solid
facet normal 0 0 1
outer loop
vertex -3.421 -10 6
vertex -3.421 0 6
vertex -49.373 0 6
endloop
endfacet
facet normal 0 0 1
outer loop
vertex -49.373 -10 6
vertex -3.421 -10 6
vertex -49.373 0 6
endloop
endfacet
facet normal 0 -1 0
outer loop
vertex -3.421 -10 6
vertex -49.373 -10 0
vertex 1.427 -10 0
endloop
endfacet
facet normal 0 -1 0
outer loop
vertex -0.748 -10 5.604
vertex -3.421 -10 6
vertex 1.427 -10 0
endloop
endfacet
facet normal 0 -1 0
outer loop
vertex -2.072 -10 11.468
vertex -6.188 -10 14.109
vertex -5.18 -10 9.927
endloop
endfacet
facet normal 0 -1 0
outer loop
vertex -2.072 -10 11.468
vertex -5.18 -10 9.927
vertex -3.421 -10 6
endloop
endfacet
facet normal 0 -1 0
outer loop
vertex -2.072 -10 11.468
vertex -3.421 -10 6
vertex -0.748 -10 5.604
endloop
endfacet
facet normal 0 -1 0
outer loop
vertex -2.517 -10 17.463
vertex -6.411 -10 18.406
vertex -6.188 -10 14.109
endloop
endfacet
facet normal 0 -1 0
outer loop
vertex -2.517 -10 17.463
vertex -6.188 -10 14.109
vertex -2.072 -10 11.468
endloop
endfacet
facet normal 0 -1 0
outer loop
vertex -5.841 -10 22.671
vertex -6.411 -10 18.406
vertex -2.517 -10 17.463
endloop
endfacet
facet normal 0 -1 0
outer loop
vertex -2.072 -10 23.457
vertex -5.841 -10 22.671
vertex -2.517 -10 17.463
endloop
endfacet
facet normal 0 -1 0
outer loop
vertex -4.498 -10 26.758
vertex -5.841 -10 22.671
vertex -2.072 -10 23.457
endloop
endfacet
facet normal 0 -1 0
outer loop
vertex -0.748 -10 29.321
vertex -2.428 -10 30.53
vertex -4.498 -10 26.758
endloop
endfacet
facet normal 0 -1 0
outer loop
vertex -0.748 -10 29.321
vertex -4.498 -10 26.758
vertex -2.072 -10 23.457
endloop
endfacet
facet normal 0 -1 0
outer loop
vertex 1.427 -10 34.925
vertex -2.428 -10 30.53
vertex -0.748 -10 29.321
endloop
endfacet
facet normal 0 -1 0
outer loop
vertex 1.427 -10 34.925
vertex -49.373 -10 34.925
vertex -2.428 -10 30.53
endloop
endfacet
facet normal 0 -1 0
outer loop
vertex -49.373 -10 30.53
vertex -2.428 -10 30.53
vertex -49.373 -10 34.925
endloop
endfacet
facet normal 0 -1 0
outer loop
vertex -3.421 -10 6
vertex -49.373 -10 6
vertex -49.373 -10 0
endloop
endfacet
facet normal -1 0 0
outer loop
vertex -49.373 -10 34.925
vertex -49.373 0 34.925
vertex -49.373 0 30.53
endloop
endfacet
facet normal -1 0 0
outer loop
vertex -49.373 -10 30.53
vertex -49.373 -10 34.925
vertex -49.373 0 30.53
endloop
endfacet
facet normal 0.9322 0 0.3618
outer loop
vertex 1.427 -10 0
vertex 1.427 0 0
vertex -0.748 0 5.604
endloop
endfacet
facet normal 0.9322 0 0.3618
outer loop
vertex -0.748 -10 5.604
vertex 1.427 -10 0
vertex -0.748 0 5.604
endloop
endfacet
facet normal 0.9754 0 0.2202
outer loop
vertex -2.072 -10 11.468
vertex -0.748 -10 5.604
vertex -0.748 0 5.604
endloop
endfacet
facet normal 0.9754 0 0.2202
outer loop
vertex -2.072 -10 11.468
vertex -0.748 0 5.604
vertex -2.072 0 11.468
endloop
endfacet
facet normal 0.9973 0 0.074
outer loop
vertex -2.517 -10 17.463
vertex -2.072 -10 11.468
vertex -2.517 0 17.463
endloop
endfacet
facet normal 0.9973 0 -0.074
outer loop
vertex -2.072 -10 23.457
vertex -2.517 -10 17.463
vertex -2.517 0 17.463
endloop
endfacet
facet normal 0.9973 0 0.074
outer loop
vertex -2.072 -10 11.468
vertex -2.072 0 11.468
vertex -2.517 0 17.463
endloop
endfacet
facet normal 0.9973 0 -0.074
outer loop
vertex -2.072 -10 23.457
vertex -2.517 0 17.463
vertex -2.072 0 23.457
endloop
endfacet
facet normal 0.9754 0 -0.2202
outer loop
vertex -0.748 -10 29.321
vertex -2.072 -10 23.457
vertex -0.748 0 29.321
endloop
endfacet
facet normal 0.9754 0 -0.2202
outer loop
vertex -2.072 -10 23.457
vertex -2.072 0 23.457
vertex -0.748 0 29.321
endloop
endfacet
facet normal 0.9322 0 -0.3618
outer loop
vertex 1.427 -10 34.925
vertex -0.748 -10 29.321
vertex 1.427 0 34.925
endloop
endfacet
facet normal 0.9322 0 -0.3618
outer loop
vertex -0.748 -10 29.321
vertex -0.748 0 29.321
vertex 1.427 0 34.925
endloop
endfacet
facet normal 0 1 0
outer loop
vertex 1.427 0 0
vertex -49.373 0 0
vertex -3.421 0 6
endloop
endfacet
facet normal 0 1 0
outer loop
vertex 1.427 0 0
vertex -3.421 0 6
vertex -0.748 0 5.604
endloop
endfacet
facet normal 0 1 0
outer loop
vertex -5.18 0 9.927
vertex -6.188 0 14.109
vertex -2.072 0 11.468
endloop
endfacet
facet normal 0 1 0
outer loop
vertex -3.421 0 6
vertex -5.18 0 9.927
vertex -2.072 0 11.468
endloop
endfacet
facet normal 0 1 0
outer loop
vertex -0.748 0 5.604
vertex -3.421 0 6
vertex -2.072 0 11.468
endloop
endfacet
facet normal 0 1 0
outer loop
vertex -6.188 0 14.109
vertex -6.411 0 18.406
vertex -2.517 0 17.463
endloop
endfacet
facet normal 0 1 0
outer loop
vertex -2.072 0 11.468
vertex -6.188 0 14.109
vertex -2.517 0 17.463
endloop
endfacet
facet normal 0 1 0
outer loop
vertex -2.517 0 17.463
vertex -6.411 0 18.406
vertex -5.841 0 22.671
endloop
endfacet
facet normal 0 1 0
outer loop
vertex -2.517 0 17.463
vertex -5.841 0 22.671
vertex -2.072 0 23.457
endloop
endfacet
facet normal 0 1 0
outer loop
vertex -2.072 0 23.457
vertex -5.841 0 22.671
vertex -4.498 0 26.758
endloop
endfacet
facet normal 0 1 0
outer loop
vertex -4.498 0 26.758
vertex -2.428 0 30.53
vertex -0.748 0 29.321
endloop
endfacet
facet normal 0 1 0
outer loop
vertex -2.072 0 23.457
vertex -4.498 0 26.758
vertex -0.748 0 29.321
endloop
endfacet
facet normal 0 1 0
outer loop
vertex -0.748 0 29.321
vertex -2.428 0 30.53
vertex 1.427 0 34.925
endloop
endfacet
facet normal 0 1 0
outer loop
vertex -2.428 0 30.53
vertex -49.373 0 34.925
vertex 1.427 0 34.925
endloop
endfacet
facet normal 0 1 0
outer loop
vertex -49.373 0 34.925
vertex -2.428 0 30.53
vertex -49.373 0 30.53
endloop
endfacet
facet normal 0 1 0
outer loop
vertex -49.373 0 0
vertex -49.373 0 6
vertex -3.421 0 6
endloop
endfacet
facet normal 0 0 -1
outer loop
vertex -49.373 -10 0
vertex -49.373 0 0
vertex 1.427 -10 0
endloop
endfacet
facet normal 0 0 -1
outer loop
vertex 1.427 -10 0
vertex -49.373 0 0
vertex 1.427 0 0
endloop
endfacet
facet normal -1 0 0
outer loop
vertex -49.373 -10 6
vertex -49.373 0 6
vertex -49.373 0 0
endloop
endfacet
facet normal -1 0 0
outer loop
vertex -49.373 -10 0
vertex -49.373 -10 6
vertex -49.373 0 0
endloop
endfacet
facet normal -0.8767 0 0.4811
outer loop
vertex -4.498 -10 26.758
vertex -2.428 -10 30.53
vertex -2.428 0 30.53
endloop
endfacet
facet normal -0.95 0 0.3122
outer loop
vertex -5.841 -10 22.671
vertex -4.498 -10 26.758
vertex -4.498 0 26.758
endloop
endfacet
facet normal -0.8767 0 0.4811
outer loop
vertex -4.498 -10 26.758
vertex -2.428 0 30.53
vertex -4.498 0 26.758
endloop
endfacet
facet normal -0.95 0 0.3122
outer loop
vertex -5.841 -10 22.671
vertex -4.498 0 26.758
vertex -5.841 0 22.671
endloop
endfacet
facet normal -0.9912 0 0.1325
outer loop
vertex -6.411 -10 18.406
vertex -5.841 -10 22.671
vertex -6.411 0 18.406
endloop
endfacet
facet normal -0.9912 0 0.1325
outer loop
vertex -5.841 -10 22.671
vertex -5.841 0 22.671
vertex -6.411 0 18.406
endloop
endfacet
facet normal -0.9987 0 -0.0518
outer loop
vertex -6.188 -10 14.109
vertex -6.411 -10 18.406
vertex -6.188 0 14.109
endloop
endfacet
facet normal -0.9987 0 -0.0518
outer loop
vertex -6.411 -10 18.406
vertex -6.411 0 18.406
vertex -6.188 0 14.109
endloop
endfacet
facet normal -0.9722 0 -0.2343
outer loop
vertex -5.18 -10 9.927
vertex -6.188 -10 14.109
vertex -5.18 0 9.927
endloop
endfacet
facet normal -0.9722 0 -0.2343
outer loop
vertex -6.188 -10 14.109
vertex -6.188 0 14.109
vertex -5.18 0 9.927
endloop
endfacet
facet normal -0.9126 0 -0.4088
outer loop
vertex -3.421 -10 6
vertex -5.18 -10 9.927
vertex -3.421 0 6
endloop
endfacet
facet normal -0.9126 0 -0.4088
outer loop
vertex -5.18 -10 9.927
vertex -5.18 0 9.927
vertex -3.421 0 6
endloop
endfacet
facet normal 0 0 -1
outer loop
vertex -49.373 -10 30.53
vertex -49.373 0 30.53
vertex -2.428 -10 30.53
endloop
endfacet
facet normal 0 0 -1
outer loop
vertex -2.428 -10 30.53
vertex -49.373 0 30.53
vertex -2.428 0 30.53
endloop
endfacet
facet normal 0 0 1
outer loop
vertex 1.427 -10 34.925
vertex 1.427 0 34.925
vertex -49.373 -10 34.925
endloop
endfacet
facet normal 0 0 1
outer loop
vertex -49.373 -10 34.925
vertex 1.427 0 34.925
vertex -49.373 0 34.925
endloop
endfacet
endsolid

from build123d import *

# Parameters (mm, degrees)
F1_DEPTH = 10


with BuildPart() as f1:
    # F0 (on Front) → F1 (new body)
    with BuildSketch(Plane.XZ):
        with BuildLine():
            Line((1.427054, 34.925), (-49.372946, 34.925))
            Line((-49.372946, 34.925), (-49.372946, 30.529865))
            Line((-49.372946, 30.529865), (-2.427831, 30.529865))
            ThreePointArc((-2.427831, 30.529865), (-0.638579, 32.848636), (1.427054, 34.925))
        make_face()
        with BuildLine():
            Line((-49.372946, 0), (1.427054, 0))
            ThreePointArc((1.427054, 0), (-1.246391, 2.798302), (-3.420543, 6))
            Line((-3.420543, 6), (-49.372946, 6))
            Line((-49.372946, 6), (-49.372946, 0))
        make_face()
        with BuildLine():
            ThreePointArc((1.427054, 0), (-2.517107, 17.4625), (1.427054, 34.925))
            ThreePointArc((1.427054, 34.925), (-0.638579, 32.848636), (-2.427831, 30.529865))
            ThreePointArc((-2.427831, 30.529865), (-6.410939, 18.40604), (-3.420543, 6))
            ThreePointArc((-3.420543, 6), (-1.246391, 2.798302), (1.427054, 0))
        make_face()
    extrude(amount=F1_DEPTH)


solid = f1.part
